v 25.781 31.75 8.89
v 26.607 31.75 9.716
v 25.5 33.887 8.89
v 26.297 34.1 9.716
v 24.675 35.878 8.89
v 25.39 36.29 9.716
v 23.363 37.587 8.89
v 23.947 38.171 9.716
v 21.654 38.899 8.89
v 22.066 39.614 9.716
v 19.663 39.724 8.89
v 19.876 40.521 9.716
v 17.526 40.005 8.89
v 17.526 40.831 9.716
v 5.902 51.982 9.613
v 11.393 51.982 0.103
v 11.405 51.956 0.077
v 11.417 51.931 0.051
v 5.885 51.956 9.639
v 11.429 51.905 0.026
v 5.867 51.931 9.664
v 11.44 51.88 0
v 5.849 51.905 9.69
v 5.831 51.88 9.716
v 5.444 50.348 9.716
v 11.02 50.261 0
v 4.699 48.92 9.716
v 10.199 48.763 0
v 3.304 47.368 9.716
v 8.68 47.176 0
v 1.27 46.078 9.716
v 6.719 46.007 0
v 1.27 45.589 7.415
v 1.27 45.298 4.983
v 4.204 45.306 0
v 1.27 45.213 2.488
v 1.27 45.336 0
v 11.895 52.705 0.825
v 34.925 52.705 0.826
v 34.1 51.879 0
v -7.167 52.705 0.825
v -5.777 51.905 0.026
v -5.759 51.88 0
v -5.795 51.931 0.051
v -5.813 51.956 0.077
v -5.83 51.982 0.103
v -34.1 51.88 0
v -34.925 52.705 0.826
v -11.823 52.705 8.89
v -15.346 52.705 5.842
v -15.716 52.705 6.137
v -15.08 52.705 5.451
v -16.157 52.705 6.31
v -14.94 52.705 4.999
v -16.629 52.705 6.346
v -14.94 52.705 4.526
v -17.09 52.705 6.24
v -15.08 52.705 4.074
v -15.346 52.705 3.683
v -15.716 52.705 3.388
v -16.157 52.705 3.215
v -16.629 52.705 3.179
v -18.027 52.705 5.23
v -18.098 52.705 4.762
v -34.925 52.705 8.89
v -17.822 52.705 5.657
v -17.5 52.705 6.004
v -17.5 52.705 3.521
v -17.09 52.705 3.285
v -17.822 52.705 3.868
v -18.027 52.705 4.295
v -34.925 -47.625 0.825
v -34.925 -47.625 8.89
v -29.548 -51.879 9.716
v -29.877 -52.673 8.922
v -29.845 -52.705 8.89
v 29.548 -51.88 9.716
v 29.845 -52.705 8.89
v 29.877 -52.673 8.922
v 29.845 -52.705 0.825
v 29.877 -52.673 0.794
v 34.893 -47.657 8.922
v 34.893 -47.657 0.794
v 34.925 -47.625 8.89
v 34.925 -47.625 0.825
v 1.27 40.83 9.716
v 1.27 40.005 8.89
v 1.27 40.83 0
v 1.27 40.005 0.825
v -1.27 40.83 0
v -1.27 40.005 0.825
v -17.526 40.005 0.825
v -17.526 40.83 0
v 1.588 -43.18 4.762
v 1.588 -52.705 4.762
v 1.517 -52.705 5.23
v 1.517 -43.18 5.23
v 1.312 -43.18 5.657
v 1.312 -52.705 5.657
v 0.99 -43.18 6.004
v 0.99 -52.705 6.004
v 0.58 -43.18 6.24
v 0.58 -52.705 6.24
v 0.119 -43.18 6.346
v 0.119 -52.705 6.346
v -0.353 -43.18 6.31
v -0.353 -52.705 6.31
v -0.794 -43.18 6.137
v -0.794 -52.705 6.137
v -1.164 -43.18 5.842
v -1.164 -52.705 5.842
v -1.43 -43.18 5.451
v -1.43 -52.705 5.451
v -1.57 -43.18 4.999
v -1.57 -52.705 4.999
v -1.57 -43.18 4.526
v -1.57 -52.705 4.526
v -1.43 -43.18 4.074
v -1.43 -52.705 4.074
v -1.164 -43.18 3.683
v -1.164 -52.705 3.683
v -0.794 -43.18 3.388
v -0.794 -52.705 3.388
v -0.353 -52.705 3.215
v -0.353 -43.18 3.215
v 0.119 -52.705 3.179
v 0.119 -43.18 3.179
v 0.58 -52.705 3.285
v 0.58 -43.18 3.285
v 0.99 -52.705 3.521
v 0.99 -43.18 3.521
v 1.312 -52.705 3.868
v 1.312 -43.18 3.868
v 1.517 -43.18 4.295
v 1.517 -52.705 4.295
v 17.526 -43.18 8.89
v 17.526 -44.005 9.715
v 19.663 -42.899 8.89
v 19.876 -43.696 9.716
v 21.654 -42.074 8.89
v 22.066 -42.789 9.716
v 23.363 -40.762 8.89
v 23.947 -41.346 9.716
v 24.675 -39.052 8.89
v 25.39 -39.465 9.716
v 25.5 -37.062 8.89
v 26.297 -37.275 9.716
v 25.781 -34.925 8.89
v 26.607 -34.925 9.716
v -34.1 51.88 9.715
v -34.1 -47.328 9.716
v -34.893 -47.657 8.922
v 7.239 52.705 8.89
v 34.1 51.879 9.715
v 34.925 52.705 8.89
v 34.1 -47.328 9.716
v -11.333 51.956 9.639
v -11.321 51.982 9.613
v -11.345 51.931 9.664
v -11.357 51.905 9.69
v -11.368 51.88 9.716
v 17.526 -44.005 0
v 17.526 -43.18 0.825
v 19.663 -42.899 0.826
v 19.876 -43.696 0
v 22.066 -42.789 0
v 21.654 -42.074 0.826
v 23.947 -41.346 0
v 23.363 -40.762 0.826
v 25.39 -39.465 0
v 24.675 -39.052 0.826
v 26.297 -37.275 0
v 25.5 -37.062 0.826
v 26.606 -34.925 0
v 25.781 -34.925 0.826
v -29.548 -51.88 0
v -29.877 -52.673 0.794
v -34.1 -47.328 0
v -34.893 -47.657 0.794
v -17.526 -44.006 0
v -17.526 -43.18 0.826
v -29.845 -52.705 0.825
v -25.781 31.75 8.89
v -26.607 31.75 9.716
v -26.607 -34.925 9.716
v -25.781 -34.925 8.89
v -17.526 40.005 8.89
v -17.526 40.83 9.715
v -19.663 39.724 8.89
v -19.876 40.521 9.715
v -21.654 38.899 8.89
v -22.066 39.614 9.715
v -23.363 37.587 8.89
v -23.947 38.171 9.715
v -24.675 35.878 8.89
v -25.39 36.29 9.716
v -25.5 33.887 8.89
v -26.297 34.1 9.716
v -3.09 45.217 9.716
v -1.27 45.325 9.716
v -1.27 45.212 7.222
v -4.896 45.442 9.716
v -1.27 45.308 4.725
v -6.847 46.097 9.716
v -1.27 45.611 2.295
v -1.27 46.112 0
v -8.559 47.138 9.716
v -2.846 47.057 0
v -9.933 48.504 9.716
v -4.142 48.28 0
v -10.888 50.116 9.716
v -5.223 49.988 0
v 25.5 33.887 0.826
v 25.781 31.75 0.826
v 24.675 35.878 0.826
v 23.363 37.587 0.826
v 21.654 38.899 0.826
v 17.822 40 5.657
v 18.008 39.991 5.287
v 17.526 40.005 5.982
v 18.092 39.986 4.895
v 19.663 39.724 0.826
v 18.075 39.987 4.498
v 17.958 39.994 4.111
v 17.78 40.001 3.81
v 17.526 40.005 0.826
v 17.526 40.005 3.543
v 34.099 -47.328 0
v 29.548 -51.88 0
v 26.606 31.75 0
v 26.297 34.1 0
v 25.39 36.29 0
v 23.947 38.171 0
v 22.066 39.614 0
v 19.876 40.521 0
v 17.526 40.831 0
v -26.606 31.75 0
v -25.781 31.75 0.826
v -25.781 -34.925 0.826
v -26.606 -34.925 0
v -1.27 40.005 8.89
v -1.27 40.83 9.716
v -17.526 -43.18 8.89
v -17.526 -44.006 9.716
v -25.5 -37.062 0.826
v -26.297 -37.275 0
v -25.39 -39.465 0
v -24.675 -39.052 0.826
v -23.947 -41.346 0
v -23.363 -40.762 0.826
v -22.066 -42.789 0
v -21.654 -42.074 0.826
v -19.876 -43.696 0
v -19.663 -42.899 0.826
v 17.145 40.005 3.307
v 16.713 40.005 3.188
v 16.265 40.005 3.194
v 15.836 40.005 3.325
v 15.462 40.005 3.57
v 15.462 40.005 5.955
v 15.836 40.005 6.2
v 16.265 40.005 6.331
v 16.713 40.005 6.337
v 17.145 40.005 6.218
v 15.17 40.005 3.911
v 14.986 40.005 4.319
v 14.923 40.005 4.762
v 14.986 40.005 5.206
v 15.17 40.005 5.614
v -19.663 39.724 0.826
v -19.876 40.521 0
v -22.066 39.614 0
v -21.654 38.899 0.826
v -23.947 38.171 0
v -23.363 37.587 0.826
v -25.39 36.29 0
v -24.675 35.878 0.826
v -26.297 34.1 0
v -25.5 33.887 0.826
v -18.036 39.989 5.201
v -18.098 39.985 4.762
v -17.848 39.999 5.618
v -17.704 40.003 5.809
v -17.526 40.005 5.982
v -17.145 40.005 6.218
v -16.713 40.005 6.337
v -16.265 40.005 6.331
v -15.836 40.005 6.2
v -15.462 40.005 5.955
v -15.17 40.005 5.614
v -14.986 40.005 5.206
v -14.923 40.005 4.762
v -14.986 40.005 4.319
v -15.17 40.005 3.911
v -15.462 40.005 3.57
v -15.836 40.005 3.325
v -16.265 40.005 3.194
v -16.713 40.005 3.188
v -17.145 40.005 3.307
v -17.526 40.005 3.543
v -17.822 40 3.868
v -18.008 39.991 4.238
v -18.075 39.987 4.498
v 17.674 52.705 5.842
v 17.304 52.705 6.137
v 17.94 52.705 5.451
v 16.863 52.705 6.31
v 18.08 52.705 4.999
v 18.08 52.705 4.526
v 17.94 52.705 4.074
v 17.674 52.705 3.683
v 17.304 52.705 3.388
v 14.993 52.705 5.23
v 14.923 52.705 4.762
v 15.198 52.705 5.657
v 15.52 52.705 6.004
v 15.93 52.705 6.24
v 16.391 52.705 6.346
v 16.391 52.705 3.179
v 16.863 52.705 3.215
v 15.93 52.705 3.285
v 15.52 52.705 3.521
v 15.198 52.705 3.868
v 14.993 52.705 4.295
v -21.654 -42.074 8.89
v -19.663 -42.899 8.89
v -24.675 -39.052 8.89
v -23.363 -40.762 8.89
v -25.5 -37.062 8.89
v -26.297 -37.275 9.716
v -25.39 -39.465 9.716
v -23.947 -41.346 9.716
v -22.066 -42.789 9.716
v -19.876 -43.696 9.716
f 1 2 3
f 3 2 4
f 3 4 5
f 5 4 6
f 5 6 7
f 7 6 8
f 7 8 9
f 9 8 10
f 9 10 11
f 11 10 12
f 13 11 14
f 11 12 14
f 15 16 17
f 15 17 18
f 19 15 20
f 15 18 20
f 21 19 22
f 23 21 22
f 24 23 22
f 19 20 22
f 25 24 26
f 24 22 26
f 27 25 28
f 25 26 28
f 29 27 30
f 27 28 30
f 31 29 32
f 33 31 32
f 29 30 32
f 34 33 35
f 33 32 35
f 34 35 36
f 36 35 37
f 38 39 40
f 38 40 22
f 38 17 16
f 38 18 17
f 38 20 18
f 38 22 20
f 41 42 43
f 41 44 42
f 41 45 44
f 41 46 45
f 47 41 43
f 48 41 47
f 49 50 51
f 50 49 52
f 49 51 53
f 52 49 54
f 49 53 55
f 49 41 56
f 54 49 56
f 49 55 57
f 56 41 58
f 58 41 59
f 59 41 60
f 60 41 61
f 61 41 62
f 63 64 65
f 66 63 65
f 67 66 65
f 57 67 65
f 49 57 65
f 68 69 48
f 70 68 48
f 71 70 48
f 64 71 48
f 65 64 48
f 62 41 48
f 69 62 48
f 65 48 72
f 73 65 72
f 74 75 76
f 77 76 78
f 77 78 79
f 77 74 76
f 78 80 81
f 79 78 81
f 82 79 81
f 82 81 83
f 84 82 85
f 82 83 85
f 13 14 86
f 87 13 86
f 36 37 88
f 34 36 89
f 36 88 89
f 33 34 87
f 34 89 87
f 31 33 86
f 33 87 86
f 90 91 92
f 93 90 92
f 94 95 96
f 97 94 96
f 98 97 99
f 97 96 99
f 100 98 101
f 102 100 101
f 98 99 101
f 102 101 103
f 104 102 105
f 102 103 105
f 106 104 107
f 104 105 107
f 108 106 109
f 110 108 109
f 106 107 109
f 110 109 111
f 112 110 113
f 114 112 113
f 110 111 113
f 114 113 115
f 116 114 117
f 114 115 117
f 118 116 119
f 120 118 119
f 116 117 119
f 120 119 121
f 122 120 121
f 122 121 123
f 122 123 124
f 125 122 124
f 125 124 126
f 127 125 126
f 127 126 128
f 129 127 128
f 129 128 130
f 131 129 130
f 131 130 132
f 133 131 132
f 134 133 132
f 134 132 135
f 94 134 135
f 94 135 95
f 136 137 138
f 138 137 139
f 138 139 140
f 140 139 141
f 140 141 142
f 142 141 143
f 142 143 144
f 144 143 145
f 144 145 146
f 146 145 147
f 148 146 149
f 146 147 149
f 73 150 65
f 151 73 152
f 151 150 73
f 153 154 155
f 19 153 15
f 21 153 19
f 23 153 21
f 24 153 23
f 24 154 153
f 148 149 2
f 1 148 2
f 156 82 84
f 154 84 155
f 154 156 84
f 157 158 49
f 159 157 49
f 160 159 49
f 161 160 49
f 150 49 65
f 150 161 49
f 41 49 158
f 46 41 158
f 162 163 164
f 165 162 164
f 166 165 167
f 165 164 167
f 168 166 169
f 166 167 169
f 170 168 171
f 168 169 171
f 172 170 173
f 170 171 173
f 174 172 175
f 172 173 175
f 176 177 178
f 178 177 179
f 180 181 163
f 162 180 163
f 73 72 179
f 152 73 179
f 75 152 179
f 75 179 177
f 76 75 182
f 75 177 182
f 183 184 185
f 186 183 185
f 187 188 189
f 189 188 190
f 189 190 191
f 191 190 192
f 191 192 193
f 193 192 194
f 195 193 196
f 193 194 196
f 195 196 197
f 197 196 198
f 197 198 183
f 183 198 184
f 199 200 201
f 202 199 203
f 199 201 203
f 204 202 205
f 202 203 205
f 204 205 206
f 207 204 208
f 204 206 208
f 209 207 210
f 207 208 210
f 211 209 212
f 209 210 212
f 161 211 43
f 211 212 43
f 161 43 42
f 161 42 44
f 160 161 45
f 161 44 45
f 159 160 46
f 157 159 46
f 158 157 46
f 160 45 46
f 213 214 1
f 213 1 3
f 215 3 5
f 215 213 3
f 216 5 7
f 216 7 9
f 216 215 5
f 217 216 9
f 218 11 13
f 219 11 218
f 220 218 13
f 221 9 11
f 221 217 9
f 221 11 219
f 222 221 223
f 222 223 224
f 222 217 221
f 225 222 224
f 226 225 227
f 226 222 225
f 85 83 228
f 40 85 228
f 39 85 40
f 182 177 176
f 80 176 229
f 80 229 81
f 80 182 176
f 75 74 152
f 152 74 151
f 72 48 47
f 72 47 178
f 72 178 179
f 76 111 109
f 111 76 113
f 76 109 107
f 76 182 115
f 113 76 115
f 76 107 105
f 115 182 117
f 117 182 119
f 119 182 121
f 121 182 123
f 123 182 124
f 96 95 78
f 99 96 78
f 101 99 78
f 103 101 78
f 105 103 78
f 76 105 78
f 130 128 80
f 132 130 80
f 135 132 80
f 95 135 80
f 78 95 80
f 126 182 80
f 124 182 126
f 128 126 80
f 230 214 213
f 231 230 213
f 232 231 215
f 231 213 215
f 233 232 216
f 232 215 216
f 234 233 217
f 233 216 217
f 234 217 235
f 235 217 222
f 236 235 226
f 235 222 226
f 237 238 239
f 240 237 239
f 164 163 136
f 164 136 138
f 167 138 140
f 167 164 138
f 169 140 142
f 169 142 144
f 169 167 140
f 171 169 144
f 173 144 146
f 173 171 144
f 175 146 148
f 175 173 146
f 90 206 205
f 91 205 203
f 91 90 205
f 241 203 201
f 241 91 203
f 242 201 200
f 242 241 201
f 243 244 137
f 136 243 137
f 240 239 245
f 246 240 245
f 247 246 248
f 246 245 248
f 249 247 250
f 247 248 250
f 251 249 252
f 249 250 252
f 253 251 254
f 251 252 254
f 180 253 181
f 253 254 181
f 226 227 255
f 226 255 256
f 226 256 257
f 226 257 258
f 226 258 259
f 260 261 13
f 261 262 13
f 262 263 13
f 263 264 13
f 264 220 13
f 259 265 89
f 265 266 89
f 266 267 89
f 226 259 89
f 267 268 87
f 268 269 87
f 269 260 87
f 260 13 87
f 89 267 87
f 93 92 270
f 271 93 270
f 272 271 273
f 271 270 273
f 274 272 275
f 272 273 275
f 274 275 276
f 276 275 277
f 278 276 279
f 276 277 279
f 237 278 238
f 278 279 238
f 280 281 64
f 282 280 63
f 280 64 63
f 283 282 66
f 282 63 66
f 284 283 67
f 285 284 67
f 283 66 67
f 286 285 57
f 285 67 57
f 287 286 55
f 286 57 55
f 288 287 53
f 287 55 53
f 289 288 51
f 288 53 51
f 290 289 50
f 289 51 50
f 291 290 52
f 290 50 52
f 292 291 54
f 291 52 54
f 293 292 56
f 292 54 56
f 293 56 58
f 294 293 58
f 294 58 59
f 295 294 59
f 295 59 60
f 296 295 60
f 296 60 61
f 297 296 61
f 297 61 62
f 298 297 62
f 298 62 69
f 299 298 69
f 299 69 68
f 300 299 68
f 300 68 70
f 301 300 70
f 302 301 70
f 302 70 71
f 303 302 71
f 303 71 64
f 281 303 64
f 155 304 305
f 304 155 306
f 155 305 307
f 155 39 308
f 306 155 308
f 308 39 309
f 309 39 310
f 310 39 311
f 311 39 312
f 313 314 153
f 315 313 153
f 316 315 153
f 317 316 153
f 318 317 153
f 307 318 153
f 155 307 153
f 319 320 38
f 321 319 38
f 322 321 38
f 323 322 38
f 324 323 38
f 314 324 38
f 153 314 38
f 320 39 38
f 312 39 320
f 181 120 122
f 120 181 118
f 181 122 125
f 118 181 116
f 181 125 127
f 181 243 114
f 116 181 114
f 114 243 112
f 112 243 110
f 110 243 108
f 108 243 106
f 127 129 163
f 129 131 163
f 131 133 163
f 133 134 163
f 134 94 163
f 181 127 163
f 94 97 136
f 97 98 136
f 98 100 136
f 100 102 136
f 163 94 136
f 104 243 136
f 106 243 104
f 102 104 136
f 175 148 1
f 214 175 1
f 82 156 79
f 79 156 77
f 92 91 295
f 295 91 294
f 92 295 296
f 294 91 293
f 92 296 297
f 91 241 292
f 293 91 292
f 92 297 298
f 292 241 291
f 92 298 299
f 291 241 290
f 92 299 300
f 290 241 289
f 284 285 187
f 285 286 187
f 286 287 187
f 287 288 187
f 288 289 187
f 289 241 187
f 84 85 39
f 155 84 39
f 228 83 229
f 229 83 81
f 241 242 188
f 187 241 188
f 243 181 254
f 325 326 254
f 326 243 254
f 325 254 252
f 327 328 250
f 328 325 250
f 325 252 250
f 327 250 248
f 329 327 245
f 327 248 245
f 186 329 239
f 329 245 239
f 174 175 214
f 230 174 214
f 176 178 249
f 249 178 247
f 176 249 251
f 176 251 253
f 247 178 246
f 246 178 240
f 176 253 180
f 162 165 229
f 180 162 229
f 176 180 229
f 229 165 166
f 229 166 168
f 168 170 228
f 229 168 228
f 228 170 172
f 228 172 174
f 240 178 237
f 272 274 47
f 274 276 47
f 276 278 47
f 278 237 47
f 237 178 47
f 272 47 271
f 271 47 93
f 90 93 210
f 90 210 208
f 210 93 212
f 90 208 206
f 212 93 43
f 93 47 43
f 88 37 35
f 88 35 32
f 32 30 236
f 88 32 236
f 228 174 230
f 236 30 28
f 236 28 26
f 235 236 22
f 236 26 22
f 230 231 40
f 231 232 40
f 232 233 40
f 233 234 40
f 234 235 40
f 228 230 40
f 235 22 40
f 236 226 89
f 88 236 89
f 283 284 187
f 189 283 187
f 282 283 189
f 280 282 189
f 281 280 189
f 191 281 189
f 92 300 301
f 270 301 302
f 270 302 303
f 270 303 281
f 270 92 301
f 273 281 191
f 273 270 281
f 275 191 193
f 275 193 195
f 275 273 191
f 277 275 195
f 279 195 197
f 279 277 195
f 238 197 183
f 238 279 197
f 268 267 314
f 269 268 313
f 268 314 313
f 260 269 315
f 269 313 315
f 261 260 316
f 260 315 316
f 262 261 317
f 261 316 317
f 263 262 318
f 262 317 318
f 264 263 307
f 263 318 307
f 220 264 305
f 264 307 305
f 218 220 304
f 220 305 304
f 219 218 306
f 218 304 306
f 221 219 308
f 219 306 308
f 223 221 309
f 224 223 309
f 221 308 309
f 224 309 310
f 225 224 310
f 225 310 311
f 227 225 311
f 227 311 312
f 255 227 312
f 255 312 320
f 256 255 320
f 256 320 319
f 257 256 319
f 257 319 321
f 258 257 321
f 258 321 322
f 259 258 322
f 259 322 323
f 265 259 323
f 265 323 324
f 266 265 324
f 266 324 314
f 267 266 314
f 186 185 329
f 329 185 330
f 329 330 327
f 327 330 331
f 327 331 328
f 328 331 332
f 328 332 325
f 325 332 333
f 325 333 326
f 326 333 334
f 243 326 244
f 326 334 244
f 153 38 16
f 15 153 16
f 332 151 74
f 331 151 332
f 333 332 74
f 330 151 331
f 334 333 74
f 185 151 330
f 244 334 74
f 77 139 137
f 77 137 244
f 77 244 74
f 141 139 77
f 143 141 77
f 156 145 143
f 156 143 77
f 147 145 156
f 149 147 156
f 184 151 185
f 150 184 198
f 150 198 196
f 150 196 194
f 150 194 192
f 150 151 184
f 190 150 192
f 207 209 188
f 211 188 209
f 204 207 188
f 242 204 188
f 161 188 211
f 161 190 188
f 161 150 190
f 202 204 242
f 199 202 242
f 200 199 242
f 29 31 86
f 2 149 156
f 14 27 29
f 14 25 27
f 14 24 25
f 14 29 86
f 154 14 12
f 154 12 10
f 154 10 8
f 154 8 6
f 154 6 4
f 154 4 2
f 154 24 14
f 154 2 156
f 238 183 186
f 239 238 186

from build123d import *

# Parameters (mm, degrees)
F0_W         = 34.925
F0_H         = 52.705
F1_DEPTH     = 9.7155
F2_W         = 25.781
F2_H         = 43.18
F2_H_2       = 40.005
F3_DEPTH     = 25.4
F4_R         = 8.255
F5_SIZE      = 0.8255
F6_R         = 1.5875
F7_DEPTH     = 25.4
F8_T1_DEPTH  = 34.1927991577
F9_SIZE      = 0.79375
F10_R        = 1.5875
F11_DEPTH    = 25.4
F13_R        = 7.493
F14_DEPTH    = 50.8
F15_T1_DEPTH = 13.2391086204
F15_T3_DEPTH = 13.2391086204
F16_W        = 2.54
F16_H        = 15.24
F17_DEPTH    = 25.4


# Not quite as in the source:
# - a fillet or chamfer that OpenCascade refuses, or shapes differently, is made with other operations: its cross-section is extruded or revolved along the edge and cut away or added
# - a feature names something its author has since deleted; it is built from what else it names


with BuildPart() as f1:
    # F0 (on Top) → F1 (new body)
    with BuildSketch(Plane.XY):
        with Locations((-17.4625, -26.3525)):
            Rectangle(F0_W, F0_H)
        with Locations((-17.4625, 26.3525)):
            Rectangle(F0_W, F0_H)
        Polygon((0, 52.705), (0, 0), (0, -52.705), (34.925, -52.705), (34.925, 0), (34.925, 52.705), align=None)
    extrude(amount=F1_DEPTH)

    # F2 (on face) → F3 (cut)
    with BuildSketch(Plane.XY.offset(9.7155)):
        with Locations((-12.8905, -21.59)):
            Rectangle(F2_W, F2_H)
        with Locations((-12.8905, 20.0025)):
            Rectangle(F2_W, F2_H_2)
        with Locations((12.8905, -21.59)):
            Rectangle(F2_W, F2_H)
        with Locations((12.8905, 20.0025)):
            Rectangle(F2_W, F2_H_2)
    extrude(amount=-F3_DEPTH, mode=Mode.SUBTRACT)

    # F4
    f4_edges = [f1.edges().sort_by_distance(p)[0] for p in [
        (-25.781, 40.005, 4.85775),
        (25.781, 40.005, 4.85775),
        (-25.781, -43.18, 4.85775),
        (25.781, -43.18, 4.85775),
    ]]
    fillet(f4_edges, radius=F4_R)

    # F5
    f5_edges = [f1.edges().sort_by_distance(p)[0] for p in [
        (-34.925, 0, 9.7155),
        (-25.781, -1.5875, 9.7155),
        (34.925, 0, 9.7155),
        (0, -52.705, 9.7155),
        (0, 52.705, 9.7155),
        (-34.925, 0, 0),
        (0, -52.705, 0),
        (34.925, 0, 0),
        (25.781, -1.5875, 0),
        (0, 52.705, 0),
        (-25.781, -1.5875, 0),
        (-23.363166, 37.587166, 0),
        (-23.363166, -40.762166, 0),
        (0, 40.005, 0),
        (0, -43.18, 0),
        (23.363166, 37.587166, 0),
        (23.363166, -40.762166, 0),
        (-23.363166, 37.587166, 9.7155),
        (-23.363166, -40.762166, 9.7155),
        (0, 40.005, 9.7155),
        (0, -43.18, 9.7155),
        (23.363166, 37.587166, 9.7155),
        (23.363166, -40.762166, 9.7155),
        (25.781, -1.5875, 9.7155),
    ]]
    chamfer(f5_edges, length=F5_SIZE)

    # F6 (on face) → F7 (cut)
    with BuildSketch(Plane(origin=(0, 52.705, 0), x_dir=(-1, 0, 0), z_dir=(0, 1, 0))):
        with Locations((-16.51, 4.7625)):
            Circle(F6_R)
        with Locations((16.51, 4.7625)):
            Circle(F6_R)
    extrude(amount=-F7_DEPTH, mode=Mode.SUBTRACT)

    # F8: chamfer of 5.08 on 2 edges, made by hand

    # F8_s2 → F8_t1 (cut)
    with BuildSketch(Plane.XY.offset(-12.2386495789)):
        Polygon((-34.925, -47.625), (-29.845, -52.705), (-34.925, -52.705), align=None)
        Polygon((29.845, -52.705), (34.925, -47.625), (34.925, -52.705), align=None)
    extrude(amount=F8_T1_DEPTH, mode=Mode.SUBTRACT)

    # F9
    f9_edges = [f1.edges().sort_by_distance(p)[0] for p in [
        (-32.385, -50.165, 0),
        (32.385, -50.165, 0),
        (32.385, -50.165, 9.7155),
        (-32.385, -50.165, 9.7155),
    ]]
    chamfer(f9_edges, length=F9_SIZE)

    # F10 (on face) → F11 (cut)
    with BuildSketch(Plane.XZ.offset(52.705)):
        with Locations((0, 4.7625)):
            Circle(F10_R)
    extrude(amount=-F11_DEPTH, mode=Mode.SUBTRACT)

    # F13 (on face) + F2 (on face) → F14 (cut)
    with BuildSketch(Plane(origin=(8.524875, 0, -14.7655166282), x_dir=(0.8660254038, 0, 0.5), z_dir=(0.5, 0, -0.8660254038))):
        with Locations((2.460086914, -52.705)):
            Circle(F13_R)
    with BuildSketch(Plane.XY.offset(9.7155)):
        with Locations((-12.8905, -21.59)):
            Rectangle(F2_W, F2_H)
        with Locations((-12.8905, 20.0025)):
            Rectangle(F2_W, F2_H_2)
        with Locations((12.8905, -21.59)):
            Rectangle(F2_W, F2_H)
        with Locations((12.8905, 20.0025)):
            Rectangle(F2_W, F2_H_2)
    extrude(amount=-F14_DEPTH, dir=(0.5, 0, -0.8660254038), mode=Mode.SUBTRACT)

    # F15: chamfer of 0.8001 on 2 edges, made by hand

    # F15_s2 → F15_t1 (cut)
    with BuildSketch(Plane(origin=(3.3783625895, 0, -5.8514956514), x_dir=(0, 1, 0), z_dir=(-0.5, 0, 0.8660254038))):
        with BuildLine():
            Line((52.705, -10.7145007393), (51.9820918836, -9.9181330962))
            ThreePointArc((51.9820918836, -9.9181330962), (52.3317918419, -9.9437868459), (52.705, -9.953086914))
            Line((52.705, -9.953086914), (52.705, -10.7145007393))
        make_face()
    extrude(amount=F15_T1_DEPTH, mode=Mode.SUBTRACT)

    # F15_s4 → F15_t3 (cut)
    with BuildSketch(Plane(origin=(-7.5672772878, 0, 13.1069087374), x_dir=(0, 1, 0), z_dir=(0.5, 0, -0.8660254038))):
        with BuildLine():
            Line((52.705, -5.7943269113), (51.9820918836, -4.9979592682))
            ThreePointArc((51.9820918836, -4.9979592682), (52.3317918419, -5.0236130179), (52.705, -5.032913086))
            Line((52.705, -5.032913086), (52.705, -5.7943269113))
        make_face()
    extrude(amount=F15_T3_DEPTH, mode=Mode.SUBTRACT)

    # F16 (on face) → F17 (cut)
    with BuildSketch(Plane.XZ.offset(-40.005)):
        with Locations((0, 5.08)):
            Rectangle(F16_W, F16_H)
    extrude(amount=-F17_DEPTH, mode=Mode.SUBTRACT)


solid = f1.part
